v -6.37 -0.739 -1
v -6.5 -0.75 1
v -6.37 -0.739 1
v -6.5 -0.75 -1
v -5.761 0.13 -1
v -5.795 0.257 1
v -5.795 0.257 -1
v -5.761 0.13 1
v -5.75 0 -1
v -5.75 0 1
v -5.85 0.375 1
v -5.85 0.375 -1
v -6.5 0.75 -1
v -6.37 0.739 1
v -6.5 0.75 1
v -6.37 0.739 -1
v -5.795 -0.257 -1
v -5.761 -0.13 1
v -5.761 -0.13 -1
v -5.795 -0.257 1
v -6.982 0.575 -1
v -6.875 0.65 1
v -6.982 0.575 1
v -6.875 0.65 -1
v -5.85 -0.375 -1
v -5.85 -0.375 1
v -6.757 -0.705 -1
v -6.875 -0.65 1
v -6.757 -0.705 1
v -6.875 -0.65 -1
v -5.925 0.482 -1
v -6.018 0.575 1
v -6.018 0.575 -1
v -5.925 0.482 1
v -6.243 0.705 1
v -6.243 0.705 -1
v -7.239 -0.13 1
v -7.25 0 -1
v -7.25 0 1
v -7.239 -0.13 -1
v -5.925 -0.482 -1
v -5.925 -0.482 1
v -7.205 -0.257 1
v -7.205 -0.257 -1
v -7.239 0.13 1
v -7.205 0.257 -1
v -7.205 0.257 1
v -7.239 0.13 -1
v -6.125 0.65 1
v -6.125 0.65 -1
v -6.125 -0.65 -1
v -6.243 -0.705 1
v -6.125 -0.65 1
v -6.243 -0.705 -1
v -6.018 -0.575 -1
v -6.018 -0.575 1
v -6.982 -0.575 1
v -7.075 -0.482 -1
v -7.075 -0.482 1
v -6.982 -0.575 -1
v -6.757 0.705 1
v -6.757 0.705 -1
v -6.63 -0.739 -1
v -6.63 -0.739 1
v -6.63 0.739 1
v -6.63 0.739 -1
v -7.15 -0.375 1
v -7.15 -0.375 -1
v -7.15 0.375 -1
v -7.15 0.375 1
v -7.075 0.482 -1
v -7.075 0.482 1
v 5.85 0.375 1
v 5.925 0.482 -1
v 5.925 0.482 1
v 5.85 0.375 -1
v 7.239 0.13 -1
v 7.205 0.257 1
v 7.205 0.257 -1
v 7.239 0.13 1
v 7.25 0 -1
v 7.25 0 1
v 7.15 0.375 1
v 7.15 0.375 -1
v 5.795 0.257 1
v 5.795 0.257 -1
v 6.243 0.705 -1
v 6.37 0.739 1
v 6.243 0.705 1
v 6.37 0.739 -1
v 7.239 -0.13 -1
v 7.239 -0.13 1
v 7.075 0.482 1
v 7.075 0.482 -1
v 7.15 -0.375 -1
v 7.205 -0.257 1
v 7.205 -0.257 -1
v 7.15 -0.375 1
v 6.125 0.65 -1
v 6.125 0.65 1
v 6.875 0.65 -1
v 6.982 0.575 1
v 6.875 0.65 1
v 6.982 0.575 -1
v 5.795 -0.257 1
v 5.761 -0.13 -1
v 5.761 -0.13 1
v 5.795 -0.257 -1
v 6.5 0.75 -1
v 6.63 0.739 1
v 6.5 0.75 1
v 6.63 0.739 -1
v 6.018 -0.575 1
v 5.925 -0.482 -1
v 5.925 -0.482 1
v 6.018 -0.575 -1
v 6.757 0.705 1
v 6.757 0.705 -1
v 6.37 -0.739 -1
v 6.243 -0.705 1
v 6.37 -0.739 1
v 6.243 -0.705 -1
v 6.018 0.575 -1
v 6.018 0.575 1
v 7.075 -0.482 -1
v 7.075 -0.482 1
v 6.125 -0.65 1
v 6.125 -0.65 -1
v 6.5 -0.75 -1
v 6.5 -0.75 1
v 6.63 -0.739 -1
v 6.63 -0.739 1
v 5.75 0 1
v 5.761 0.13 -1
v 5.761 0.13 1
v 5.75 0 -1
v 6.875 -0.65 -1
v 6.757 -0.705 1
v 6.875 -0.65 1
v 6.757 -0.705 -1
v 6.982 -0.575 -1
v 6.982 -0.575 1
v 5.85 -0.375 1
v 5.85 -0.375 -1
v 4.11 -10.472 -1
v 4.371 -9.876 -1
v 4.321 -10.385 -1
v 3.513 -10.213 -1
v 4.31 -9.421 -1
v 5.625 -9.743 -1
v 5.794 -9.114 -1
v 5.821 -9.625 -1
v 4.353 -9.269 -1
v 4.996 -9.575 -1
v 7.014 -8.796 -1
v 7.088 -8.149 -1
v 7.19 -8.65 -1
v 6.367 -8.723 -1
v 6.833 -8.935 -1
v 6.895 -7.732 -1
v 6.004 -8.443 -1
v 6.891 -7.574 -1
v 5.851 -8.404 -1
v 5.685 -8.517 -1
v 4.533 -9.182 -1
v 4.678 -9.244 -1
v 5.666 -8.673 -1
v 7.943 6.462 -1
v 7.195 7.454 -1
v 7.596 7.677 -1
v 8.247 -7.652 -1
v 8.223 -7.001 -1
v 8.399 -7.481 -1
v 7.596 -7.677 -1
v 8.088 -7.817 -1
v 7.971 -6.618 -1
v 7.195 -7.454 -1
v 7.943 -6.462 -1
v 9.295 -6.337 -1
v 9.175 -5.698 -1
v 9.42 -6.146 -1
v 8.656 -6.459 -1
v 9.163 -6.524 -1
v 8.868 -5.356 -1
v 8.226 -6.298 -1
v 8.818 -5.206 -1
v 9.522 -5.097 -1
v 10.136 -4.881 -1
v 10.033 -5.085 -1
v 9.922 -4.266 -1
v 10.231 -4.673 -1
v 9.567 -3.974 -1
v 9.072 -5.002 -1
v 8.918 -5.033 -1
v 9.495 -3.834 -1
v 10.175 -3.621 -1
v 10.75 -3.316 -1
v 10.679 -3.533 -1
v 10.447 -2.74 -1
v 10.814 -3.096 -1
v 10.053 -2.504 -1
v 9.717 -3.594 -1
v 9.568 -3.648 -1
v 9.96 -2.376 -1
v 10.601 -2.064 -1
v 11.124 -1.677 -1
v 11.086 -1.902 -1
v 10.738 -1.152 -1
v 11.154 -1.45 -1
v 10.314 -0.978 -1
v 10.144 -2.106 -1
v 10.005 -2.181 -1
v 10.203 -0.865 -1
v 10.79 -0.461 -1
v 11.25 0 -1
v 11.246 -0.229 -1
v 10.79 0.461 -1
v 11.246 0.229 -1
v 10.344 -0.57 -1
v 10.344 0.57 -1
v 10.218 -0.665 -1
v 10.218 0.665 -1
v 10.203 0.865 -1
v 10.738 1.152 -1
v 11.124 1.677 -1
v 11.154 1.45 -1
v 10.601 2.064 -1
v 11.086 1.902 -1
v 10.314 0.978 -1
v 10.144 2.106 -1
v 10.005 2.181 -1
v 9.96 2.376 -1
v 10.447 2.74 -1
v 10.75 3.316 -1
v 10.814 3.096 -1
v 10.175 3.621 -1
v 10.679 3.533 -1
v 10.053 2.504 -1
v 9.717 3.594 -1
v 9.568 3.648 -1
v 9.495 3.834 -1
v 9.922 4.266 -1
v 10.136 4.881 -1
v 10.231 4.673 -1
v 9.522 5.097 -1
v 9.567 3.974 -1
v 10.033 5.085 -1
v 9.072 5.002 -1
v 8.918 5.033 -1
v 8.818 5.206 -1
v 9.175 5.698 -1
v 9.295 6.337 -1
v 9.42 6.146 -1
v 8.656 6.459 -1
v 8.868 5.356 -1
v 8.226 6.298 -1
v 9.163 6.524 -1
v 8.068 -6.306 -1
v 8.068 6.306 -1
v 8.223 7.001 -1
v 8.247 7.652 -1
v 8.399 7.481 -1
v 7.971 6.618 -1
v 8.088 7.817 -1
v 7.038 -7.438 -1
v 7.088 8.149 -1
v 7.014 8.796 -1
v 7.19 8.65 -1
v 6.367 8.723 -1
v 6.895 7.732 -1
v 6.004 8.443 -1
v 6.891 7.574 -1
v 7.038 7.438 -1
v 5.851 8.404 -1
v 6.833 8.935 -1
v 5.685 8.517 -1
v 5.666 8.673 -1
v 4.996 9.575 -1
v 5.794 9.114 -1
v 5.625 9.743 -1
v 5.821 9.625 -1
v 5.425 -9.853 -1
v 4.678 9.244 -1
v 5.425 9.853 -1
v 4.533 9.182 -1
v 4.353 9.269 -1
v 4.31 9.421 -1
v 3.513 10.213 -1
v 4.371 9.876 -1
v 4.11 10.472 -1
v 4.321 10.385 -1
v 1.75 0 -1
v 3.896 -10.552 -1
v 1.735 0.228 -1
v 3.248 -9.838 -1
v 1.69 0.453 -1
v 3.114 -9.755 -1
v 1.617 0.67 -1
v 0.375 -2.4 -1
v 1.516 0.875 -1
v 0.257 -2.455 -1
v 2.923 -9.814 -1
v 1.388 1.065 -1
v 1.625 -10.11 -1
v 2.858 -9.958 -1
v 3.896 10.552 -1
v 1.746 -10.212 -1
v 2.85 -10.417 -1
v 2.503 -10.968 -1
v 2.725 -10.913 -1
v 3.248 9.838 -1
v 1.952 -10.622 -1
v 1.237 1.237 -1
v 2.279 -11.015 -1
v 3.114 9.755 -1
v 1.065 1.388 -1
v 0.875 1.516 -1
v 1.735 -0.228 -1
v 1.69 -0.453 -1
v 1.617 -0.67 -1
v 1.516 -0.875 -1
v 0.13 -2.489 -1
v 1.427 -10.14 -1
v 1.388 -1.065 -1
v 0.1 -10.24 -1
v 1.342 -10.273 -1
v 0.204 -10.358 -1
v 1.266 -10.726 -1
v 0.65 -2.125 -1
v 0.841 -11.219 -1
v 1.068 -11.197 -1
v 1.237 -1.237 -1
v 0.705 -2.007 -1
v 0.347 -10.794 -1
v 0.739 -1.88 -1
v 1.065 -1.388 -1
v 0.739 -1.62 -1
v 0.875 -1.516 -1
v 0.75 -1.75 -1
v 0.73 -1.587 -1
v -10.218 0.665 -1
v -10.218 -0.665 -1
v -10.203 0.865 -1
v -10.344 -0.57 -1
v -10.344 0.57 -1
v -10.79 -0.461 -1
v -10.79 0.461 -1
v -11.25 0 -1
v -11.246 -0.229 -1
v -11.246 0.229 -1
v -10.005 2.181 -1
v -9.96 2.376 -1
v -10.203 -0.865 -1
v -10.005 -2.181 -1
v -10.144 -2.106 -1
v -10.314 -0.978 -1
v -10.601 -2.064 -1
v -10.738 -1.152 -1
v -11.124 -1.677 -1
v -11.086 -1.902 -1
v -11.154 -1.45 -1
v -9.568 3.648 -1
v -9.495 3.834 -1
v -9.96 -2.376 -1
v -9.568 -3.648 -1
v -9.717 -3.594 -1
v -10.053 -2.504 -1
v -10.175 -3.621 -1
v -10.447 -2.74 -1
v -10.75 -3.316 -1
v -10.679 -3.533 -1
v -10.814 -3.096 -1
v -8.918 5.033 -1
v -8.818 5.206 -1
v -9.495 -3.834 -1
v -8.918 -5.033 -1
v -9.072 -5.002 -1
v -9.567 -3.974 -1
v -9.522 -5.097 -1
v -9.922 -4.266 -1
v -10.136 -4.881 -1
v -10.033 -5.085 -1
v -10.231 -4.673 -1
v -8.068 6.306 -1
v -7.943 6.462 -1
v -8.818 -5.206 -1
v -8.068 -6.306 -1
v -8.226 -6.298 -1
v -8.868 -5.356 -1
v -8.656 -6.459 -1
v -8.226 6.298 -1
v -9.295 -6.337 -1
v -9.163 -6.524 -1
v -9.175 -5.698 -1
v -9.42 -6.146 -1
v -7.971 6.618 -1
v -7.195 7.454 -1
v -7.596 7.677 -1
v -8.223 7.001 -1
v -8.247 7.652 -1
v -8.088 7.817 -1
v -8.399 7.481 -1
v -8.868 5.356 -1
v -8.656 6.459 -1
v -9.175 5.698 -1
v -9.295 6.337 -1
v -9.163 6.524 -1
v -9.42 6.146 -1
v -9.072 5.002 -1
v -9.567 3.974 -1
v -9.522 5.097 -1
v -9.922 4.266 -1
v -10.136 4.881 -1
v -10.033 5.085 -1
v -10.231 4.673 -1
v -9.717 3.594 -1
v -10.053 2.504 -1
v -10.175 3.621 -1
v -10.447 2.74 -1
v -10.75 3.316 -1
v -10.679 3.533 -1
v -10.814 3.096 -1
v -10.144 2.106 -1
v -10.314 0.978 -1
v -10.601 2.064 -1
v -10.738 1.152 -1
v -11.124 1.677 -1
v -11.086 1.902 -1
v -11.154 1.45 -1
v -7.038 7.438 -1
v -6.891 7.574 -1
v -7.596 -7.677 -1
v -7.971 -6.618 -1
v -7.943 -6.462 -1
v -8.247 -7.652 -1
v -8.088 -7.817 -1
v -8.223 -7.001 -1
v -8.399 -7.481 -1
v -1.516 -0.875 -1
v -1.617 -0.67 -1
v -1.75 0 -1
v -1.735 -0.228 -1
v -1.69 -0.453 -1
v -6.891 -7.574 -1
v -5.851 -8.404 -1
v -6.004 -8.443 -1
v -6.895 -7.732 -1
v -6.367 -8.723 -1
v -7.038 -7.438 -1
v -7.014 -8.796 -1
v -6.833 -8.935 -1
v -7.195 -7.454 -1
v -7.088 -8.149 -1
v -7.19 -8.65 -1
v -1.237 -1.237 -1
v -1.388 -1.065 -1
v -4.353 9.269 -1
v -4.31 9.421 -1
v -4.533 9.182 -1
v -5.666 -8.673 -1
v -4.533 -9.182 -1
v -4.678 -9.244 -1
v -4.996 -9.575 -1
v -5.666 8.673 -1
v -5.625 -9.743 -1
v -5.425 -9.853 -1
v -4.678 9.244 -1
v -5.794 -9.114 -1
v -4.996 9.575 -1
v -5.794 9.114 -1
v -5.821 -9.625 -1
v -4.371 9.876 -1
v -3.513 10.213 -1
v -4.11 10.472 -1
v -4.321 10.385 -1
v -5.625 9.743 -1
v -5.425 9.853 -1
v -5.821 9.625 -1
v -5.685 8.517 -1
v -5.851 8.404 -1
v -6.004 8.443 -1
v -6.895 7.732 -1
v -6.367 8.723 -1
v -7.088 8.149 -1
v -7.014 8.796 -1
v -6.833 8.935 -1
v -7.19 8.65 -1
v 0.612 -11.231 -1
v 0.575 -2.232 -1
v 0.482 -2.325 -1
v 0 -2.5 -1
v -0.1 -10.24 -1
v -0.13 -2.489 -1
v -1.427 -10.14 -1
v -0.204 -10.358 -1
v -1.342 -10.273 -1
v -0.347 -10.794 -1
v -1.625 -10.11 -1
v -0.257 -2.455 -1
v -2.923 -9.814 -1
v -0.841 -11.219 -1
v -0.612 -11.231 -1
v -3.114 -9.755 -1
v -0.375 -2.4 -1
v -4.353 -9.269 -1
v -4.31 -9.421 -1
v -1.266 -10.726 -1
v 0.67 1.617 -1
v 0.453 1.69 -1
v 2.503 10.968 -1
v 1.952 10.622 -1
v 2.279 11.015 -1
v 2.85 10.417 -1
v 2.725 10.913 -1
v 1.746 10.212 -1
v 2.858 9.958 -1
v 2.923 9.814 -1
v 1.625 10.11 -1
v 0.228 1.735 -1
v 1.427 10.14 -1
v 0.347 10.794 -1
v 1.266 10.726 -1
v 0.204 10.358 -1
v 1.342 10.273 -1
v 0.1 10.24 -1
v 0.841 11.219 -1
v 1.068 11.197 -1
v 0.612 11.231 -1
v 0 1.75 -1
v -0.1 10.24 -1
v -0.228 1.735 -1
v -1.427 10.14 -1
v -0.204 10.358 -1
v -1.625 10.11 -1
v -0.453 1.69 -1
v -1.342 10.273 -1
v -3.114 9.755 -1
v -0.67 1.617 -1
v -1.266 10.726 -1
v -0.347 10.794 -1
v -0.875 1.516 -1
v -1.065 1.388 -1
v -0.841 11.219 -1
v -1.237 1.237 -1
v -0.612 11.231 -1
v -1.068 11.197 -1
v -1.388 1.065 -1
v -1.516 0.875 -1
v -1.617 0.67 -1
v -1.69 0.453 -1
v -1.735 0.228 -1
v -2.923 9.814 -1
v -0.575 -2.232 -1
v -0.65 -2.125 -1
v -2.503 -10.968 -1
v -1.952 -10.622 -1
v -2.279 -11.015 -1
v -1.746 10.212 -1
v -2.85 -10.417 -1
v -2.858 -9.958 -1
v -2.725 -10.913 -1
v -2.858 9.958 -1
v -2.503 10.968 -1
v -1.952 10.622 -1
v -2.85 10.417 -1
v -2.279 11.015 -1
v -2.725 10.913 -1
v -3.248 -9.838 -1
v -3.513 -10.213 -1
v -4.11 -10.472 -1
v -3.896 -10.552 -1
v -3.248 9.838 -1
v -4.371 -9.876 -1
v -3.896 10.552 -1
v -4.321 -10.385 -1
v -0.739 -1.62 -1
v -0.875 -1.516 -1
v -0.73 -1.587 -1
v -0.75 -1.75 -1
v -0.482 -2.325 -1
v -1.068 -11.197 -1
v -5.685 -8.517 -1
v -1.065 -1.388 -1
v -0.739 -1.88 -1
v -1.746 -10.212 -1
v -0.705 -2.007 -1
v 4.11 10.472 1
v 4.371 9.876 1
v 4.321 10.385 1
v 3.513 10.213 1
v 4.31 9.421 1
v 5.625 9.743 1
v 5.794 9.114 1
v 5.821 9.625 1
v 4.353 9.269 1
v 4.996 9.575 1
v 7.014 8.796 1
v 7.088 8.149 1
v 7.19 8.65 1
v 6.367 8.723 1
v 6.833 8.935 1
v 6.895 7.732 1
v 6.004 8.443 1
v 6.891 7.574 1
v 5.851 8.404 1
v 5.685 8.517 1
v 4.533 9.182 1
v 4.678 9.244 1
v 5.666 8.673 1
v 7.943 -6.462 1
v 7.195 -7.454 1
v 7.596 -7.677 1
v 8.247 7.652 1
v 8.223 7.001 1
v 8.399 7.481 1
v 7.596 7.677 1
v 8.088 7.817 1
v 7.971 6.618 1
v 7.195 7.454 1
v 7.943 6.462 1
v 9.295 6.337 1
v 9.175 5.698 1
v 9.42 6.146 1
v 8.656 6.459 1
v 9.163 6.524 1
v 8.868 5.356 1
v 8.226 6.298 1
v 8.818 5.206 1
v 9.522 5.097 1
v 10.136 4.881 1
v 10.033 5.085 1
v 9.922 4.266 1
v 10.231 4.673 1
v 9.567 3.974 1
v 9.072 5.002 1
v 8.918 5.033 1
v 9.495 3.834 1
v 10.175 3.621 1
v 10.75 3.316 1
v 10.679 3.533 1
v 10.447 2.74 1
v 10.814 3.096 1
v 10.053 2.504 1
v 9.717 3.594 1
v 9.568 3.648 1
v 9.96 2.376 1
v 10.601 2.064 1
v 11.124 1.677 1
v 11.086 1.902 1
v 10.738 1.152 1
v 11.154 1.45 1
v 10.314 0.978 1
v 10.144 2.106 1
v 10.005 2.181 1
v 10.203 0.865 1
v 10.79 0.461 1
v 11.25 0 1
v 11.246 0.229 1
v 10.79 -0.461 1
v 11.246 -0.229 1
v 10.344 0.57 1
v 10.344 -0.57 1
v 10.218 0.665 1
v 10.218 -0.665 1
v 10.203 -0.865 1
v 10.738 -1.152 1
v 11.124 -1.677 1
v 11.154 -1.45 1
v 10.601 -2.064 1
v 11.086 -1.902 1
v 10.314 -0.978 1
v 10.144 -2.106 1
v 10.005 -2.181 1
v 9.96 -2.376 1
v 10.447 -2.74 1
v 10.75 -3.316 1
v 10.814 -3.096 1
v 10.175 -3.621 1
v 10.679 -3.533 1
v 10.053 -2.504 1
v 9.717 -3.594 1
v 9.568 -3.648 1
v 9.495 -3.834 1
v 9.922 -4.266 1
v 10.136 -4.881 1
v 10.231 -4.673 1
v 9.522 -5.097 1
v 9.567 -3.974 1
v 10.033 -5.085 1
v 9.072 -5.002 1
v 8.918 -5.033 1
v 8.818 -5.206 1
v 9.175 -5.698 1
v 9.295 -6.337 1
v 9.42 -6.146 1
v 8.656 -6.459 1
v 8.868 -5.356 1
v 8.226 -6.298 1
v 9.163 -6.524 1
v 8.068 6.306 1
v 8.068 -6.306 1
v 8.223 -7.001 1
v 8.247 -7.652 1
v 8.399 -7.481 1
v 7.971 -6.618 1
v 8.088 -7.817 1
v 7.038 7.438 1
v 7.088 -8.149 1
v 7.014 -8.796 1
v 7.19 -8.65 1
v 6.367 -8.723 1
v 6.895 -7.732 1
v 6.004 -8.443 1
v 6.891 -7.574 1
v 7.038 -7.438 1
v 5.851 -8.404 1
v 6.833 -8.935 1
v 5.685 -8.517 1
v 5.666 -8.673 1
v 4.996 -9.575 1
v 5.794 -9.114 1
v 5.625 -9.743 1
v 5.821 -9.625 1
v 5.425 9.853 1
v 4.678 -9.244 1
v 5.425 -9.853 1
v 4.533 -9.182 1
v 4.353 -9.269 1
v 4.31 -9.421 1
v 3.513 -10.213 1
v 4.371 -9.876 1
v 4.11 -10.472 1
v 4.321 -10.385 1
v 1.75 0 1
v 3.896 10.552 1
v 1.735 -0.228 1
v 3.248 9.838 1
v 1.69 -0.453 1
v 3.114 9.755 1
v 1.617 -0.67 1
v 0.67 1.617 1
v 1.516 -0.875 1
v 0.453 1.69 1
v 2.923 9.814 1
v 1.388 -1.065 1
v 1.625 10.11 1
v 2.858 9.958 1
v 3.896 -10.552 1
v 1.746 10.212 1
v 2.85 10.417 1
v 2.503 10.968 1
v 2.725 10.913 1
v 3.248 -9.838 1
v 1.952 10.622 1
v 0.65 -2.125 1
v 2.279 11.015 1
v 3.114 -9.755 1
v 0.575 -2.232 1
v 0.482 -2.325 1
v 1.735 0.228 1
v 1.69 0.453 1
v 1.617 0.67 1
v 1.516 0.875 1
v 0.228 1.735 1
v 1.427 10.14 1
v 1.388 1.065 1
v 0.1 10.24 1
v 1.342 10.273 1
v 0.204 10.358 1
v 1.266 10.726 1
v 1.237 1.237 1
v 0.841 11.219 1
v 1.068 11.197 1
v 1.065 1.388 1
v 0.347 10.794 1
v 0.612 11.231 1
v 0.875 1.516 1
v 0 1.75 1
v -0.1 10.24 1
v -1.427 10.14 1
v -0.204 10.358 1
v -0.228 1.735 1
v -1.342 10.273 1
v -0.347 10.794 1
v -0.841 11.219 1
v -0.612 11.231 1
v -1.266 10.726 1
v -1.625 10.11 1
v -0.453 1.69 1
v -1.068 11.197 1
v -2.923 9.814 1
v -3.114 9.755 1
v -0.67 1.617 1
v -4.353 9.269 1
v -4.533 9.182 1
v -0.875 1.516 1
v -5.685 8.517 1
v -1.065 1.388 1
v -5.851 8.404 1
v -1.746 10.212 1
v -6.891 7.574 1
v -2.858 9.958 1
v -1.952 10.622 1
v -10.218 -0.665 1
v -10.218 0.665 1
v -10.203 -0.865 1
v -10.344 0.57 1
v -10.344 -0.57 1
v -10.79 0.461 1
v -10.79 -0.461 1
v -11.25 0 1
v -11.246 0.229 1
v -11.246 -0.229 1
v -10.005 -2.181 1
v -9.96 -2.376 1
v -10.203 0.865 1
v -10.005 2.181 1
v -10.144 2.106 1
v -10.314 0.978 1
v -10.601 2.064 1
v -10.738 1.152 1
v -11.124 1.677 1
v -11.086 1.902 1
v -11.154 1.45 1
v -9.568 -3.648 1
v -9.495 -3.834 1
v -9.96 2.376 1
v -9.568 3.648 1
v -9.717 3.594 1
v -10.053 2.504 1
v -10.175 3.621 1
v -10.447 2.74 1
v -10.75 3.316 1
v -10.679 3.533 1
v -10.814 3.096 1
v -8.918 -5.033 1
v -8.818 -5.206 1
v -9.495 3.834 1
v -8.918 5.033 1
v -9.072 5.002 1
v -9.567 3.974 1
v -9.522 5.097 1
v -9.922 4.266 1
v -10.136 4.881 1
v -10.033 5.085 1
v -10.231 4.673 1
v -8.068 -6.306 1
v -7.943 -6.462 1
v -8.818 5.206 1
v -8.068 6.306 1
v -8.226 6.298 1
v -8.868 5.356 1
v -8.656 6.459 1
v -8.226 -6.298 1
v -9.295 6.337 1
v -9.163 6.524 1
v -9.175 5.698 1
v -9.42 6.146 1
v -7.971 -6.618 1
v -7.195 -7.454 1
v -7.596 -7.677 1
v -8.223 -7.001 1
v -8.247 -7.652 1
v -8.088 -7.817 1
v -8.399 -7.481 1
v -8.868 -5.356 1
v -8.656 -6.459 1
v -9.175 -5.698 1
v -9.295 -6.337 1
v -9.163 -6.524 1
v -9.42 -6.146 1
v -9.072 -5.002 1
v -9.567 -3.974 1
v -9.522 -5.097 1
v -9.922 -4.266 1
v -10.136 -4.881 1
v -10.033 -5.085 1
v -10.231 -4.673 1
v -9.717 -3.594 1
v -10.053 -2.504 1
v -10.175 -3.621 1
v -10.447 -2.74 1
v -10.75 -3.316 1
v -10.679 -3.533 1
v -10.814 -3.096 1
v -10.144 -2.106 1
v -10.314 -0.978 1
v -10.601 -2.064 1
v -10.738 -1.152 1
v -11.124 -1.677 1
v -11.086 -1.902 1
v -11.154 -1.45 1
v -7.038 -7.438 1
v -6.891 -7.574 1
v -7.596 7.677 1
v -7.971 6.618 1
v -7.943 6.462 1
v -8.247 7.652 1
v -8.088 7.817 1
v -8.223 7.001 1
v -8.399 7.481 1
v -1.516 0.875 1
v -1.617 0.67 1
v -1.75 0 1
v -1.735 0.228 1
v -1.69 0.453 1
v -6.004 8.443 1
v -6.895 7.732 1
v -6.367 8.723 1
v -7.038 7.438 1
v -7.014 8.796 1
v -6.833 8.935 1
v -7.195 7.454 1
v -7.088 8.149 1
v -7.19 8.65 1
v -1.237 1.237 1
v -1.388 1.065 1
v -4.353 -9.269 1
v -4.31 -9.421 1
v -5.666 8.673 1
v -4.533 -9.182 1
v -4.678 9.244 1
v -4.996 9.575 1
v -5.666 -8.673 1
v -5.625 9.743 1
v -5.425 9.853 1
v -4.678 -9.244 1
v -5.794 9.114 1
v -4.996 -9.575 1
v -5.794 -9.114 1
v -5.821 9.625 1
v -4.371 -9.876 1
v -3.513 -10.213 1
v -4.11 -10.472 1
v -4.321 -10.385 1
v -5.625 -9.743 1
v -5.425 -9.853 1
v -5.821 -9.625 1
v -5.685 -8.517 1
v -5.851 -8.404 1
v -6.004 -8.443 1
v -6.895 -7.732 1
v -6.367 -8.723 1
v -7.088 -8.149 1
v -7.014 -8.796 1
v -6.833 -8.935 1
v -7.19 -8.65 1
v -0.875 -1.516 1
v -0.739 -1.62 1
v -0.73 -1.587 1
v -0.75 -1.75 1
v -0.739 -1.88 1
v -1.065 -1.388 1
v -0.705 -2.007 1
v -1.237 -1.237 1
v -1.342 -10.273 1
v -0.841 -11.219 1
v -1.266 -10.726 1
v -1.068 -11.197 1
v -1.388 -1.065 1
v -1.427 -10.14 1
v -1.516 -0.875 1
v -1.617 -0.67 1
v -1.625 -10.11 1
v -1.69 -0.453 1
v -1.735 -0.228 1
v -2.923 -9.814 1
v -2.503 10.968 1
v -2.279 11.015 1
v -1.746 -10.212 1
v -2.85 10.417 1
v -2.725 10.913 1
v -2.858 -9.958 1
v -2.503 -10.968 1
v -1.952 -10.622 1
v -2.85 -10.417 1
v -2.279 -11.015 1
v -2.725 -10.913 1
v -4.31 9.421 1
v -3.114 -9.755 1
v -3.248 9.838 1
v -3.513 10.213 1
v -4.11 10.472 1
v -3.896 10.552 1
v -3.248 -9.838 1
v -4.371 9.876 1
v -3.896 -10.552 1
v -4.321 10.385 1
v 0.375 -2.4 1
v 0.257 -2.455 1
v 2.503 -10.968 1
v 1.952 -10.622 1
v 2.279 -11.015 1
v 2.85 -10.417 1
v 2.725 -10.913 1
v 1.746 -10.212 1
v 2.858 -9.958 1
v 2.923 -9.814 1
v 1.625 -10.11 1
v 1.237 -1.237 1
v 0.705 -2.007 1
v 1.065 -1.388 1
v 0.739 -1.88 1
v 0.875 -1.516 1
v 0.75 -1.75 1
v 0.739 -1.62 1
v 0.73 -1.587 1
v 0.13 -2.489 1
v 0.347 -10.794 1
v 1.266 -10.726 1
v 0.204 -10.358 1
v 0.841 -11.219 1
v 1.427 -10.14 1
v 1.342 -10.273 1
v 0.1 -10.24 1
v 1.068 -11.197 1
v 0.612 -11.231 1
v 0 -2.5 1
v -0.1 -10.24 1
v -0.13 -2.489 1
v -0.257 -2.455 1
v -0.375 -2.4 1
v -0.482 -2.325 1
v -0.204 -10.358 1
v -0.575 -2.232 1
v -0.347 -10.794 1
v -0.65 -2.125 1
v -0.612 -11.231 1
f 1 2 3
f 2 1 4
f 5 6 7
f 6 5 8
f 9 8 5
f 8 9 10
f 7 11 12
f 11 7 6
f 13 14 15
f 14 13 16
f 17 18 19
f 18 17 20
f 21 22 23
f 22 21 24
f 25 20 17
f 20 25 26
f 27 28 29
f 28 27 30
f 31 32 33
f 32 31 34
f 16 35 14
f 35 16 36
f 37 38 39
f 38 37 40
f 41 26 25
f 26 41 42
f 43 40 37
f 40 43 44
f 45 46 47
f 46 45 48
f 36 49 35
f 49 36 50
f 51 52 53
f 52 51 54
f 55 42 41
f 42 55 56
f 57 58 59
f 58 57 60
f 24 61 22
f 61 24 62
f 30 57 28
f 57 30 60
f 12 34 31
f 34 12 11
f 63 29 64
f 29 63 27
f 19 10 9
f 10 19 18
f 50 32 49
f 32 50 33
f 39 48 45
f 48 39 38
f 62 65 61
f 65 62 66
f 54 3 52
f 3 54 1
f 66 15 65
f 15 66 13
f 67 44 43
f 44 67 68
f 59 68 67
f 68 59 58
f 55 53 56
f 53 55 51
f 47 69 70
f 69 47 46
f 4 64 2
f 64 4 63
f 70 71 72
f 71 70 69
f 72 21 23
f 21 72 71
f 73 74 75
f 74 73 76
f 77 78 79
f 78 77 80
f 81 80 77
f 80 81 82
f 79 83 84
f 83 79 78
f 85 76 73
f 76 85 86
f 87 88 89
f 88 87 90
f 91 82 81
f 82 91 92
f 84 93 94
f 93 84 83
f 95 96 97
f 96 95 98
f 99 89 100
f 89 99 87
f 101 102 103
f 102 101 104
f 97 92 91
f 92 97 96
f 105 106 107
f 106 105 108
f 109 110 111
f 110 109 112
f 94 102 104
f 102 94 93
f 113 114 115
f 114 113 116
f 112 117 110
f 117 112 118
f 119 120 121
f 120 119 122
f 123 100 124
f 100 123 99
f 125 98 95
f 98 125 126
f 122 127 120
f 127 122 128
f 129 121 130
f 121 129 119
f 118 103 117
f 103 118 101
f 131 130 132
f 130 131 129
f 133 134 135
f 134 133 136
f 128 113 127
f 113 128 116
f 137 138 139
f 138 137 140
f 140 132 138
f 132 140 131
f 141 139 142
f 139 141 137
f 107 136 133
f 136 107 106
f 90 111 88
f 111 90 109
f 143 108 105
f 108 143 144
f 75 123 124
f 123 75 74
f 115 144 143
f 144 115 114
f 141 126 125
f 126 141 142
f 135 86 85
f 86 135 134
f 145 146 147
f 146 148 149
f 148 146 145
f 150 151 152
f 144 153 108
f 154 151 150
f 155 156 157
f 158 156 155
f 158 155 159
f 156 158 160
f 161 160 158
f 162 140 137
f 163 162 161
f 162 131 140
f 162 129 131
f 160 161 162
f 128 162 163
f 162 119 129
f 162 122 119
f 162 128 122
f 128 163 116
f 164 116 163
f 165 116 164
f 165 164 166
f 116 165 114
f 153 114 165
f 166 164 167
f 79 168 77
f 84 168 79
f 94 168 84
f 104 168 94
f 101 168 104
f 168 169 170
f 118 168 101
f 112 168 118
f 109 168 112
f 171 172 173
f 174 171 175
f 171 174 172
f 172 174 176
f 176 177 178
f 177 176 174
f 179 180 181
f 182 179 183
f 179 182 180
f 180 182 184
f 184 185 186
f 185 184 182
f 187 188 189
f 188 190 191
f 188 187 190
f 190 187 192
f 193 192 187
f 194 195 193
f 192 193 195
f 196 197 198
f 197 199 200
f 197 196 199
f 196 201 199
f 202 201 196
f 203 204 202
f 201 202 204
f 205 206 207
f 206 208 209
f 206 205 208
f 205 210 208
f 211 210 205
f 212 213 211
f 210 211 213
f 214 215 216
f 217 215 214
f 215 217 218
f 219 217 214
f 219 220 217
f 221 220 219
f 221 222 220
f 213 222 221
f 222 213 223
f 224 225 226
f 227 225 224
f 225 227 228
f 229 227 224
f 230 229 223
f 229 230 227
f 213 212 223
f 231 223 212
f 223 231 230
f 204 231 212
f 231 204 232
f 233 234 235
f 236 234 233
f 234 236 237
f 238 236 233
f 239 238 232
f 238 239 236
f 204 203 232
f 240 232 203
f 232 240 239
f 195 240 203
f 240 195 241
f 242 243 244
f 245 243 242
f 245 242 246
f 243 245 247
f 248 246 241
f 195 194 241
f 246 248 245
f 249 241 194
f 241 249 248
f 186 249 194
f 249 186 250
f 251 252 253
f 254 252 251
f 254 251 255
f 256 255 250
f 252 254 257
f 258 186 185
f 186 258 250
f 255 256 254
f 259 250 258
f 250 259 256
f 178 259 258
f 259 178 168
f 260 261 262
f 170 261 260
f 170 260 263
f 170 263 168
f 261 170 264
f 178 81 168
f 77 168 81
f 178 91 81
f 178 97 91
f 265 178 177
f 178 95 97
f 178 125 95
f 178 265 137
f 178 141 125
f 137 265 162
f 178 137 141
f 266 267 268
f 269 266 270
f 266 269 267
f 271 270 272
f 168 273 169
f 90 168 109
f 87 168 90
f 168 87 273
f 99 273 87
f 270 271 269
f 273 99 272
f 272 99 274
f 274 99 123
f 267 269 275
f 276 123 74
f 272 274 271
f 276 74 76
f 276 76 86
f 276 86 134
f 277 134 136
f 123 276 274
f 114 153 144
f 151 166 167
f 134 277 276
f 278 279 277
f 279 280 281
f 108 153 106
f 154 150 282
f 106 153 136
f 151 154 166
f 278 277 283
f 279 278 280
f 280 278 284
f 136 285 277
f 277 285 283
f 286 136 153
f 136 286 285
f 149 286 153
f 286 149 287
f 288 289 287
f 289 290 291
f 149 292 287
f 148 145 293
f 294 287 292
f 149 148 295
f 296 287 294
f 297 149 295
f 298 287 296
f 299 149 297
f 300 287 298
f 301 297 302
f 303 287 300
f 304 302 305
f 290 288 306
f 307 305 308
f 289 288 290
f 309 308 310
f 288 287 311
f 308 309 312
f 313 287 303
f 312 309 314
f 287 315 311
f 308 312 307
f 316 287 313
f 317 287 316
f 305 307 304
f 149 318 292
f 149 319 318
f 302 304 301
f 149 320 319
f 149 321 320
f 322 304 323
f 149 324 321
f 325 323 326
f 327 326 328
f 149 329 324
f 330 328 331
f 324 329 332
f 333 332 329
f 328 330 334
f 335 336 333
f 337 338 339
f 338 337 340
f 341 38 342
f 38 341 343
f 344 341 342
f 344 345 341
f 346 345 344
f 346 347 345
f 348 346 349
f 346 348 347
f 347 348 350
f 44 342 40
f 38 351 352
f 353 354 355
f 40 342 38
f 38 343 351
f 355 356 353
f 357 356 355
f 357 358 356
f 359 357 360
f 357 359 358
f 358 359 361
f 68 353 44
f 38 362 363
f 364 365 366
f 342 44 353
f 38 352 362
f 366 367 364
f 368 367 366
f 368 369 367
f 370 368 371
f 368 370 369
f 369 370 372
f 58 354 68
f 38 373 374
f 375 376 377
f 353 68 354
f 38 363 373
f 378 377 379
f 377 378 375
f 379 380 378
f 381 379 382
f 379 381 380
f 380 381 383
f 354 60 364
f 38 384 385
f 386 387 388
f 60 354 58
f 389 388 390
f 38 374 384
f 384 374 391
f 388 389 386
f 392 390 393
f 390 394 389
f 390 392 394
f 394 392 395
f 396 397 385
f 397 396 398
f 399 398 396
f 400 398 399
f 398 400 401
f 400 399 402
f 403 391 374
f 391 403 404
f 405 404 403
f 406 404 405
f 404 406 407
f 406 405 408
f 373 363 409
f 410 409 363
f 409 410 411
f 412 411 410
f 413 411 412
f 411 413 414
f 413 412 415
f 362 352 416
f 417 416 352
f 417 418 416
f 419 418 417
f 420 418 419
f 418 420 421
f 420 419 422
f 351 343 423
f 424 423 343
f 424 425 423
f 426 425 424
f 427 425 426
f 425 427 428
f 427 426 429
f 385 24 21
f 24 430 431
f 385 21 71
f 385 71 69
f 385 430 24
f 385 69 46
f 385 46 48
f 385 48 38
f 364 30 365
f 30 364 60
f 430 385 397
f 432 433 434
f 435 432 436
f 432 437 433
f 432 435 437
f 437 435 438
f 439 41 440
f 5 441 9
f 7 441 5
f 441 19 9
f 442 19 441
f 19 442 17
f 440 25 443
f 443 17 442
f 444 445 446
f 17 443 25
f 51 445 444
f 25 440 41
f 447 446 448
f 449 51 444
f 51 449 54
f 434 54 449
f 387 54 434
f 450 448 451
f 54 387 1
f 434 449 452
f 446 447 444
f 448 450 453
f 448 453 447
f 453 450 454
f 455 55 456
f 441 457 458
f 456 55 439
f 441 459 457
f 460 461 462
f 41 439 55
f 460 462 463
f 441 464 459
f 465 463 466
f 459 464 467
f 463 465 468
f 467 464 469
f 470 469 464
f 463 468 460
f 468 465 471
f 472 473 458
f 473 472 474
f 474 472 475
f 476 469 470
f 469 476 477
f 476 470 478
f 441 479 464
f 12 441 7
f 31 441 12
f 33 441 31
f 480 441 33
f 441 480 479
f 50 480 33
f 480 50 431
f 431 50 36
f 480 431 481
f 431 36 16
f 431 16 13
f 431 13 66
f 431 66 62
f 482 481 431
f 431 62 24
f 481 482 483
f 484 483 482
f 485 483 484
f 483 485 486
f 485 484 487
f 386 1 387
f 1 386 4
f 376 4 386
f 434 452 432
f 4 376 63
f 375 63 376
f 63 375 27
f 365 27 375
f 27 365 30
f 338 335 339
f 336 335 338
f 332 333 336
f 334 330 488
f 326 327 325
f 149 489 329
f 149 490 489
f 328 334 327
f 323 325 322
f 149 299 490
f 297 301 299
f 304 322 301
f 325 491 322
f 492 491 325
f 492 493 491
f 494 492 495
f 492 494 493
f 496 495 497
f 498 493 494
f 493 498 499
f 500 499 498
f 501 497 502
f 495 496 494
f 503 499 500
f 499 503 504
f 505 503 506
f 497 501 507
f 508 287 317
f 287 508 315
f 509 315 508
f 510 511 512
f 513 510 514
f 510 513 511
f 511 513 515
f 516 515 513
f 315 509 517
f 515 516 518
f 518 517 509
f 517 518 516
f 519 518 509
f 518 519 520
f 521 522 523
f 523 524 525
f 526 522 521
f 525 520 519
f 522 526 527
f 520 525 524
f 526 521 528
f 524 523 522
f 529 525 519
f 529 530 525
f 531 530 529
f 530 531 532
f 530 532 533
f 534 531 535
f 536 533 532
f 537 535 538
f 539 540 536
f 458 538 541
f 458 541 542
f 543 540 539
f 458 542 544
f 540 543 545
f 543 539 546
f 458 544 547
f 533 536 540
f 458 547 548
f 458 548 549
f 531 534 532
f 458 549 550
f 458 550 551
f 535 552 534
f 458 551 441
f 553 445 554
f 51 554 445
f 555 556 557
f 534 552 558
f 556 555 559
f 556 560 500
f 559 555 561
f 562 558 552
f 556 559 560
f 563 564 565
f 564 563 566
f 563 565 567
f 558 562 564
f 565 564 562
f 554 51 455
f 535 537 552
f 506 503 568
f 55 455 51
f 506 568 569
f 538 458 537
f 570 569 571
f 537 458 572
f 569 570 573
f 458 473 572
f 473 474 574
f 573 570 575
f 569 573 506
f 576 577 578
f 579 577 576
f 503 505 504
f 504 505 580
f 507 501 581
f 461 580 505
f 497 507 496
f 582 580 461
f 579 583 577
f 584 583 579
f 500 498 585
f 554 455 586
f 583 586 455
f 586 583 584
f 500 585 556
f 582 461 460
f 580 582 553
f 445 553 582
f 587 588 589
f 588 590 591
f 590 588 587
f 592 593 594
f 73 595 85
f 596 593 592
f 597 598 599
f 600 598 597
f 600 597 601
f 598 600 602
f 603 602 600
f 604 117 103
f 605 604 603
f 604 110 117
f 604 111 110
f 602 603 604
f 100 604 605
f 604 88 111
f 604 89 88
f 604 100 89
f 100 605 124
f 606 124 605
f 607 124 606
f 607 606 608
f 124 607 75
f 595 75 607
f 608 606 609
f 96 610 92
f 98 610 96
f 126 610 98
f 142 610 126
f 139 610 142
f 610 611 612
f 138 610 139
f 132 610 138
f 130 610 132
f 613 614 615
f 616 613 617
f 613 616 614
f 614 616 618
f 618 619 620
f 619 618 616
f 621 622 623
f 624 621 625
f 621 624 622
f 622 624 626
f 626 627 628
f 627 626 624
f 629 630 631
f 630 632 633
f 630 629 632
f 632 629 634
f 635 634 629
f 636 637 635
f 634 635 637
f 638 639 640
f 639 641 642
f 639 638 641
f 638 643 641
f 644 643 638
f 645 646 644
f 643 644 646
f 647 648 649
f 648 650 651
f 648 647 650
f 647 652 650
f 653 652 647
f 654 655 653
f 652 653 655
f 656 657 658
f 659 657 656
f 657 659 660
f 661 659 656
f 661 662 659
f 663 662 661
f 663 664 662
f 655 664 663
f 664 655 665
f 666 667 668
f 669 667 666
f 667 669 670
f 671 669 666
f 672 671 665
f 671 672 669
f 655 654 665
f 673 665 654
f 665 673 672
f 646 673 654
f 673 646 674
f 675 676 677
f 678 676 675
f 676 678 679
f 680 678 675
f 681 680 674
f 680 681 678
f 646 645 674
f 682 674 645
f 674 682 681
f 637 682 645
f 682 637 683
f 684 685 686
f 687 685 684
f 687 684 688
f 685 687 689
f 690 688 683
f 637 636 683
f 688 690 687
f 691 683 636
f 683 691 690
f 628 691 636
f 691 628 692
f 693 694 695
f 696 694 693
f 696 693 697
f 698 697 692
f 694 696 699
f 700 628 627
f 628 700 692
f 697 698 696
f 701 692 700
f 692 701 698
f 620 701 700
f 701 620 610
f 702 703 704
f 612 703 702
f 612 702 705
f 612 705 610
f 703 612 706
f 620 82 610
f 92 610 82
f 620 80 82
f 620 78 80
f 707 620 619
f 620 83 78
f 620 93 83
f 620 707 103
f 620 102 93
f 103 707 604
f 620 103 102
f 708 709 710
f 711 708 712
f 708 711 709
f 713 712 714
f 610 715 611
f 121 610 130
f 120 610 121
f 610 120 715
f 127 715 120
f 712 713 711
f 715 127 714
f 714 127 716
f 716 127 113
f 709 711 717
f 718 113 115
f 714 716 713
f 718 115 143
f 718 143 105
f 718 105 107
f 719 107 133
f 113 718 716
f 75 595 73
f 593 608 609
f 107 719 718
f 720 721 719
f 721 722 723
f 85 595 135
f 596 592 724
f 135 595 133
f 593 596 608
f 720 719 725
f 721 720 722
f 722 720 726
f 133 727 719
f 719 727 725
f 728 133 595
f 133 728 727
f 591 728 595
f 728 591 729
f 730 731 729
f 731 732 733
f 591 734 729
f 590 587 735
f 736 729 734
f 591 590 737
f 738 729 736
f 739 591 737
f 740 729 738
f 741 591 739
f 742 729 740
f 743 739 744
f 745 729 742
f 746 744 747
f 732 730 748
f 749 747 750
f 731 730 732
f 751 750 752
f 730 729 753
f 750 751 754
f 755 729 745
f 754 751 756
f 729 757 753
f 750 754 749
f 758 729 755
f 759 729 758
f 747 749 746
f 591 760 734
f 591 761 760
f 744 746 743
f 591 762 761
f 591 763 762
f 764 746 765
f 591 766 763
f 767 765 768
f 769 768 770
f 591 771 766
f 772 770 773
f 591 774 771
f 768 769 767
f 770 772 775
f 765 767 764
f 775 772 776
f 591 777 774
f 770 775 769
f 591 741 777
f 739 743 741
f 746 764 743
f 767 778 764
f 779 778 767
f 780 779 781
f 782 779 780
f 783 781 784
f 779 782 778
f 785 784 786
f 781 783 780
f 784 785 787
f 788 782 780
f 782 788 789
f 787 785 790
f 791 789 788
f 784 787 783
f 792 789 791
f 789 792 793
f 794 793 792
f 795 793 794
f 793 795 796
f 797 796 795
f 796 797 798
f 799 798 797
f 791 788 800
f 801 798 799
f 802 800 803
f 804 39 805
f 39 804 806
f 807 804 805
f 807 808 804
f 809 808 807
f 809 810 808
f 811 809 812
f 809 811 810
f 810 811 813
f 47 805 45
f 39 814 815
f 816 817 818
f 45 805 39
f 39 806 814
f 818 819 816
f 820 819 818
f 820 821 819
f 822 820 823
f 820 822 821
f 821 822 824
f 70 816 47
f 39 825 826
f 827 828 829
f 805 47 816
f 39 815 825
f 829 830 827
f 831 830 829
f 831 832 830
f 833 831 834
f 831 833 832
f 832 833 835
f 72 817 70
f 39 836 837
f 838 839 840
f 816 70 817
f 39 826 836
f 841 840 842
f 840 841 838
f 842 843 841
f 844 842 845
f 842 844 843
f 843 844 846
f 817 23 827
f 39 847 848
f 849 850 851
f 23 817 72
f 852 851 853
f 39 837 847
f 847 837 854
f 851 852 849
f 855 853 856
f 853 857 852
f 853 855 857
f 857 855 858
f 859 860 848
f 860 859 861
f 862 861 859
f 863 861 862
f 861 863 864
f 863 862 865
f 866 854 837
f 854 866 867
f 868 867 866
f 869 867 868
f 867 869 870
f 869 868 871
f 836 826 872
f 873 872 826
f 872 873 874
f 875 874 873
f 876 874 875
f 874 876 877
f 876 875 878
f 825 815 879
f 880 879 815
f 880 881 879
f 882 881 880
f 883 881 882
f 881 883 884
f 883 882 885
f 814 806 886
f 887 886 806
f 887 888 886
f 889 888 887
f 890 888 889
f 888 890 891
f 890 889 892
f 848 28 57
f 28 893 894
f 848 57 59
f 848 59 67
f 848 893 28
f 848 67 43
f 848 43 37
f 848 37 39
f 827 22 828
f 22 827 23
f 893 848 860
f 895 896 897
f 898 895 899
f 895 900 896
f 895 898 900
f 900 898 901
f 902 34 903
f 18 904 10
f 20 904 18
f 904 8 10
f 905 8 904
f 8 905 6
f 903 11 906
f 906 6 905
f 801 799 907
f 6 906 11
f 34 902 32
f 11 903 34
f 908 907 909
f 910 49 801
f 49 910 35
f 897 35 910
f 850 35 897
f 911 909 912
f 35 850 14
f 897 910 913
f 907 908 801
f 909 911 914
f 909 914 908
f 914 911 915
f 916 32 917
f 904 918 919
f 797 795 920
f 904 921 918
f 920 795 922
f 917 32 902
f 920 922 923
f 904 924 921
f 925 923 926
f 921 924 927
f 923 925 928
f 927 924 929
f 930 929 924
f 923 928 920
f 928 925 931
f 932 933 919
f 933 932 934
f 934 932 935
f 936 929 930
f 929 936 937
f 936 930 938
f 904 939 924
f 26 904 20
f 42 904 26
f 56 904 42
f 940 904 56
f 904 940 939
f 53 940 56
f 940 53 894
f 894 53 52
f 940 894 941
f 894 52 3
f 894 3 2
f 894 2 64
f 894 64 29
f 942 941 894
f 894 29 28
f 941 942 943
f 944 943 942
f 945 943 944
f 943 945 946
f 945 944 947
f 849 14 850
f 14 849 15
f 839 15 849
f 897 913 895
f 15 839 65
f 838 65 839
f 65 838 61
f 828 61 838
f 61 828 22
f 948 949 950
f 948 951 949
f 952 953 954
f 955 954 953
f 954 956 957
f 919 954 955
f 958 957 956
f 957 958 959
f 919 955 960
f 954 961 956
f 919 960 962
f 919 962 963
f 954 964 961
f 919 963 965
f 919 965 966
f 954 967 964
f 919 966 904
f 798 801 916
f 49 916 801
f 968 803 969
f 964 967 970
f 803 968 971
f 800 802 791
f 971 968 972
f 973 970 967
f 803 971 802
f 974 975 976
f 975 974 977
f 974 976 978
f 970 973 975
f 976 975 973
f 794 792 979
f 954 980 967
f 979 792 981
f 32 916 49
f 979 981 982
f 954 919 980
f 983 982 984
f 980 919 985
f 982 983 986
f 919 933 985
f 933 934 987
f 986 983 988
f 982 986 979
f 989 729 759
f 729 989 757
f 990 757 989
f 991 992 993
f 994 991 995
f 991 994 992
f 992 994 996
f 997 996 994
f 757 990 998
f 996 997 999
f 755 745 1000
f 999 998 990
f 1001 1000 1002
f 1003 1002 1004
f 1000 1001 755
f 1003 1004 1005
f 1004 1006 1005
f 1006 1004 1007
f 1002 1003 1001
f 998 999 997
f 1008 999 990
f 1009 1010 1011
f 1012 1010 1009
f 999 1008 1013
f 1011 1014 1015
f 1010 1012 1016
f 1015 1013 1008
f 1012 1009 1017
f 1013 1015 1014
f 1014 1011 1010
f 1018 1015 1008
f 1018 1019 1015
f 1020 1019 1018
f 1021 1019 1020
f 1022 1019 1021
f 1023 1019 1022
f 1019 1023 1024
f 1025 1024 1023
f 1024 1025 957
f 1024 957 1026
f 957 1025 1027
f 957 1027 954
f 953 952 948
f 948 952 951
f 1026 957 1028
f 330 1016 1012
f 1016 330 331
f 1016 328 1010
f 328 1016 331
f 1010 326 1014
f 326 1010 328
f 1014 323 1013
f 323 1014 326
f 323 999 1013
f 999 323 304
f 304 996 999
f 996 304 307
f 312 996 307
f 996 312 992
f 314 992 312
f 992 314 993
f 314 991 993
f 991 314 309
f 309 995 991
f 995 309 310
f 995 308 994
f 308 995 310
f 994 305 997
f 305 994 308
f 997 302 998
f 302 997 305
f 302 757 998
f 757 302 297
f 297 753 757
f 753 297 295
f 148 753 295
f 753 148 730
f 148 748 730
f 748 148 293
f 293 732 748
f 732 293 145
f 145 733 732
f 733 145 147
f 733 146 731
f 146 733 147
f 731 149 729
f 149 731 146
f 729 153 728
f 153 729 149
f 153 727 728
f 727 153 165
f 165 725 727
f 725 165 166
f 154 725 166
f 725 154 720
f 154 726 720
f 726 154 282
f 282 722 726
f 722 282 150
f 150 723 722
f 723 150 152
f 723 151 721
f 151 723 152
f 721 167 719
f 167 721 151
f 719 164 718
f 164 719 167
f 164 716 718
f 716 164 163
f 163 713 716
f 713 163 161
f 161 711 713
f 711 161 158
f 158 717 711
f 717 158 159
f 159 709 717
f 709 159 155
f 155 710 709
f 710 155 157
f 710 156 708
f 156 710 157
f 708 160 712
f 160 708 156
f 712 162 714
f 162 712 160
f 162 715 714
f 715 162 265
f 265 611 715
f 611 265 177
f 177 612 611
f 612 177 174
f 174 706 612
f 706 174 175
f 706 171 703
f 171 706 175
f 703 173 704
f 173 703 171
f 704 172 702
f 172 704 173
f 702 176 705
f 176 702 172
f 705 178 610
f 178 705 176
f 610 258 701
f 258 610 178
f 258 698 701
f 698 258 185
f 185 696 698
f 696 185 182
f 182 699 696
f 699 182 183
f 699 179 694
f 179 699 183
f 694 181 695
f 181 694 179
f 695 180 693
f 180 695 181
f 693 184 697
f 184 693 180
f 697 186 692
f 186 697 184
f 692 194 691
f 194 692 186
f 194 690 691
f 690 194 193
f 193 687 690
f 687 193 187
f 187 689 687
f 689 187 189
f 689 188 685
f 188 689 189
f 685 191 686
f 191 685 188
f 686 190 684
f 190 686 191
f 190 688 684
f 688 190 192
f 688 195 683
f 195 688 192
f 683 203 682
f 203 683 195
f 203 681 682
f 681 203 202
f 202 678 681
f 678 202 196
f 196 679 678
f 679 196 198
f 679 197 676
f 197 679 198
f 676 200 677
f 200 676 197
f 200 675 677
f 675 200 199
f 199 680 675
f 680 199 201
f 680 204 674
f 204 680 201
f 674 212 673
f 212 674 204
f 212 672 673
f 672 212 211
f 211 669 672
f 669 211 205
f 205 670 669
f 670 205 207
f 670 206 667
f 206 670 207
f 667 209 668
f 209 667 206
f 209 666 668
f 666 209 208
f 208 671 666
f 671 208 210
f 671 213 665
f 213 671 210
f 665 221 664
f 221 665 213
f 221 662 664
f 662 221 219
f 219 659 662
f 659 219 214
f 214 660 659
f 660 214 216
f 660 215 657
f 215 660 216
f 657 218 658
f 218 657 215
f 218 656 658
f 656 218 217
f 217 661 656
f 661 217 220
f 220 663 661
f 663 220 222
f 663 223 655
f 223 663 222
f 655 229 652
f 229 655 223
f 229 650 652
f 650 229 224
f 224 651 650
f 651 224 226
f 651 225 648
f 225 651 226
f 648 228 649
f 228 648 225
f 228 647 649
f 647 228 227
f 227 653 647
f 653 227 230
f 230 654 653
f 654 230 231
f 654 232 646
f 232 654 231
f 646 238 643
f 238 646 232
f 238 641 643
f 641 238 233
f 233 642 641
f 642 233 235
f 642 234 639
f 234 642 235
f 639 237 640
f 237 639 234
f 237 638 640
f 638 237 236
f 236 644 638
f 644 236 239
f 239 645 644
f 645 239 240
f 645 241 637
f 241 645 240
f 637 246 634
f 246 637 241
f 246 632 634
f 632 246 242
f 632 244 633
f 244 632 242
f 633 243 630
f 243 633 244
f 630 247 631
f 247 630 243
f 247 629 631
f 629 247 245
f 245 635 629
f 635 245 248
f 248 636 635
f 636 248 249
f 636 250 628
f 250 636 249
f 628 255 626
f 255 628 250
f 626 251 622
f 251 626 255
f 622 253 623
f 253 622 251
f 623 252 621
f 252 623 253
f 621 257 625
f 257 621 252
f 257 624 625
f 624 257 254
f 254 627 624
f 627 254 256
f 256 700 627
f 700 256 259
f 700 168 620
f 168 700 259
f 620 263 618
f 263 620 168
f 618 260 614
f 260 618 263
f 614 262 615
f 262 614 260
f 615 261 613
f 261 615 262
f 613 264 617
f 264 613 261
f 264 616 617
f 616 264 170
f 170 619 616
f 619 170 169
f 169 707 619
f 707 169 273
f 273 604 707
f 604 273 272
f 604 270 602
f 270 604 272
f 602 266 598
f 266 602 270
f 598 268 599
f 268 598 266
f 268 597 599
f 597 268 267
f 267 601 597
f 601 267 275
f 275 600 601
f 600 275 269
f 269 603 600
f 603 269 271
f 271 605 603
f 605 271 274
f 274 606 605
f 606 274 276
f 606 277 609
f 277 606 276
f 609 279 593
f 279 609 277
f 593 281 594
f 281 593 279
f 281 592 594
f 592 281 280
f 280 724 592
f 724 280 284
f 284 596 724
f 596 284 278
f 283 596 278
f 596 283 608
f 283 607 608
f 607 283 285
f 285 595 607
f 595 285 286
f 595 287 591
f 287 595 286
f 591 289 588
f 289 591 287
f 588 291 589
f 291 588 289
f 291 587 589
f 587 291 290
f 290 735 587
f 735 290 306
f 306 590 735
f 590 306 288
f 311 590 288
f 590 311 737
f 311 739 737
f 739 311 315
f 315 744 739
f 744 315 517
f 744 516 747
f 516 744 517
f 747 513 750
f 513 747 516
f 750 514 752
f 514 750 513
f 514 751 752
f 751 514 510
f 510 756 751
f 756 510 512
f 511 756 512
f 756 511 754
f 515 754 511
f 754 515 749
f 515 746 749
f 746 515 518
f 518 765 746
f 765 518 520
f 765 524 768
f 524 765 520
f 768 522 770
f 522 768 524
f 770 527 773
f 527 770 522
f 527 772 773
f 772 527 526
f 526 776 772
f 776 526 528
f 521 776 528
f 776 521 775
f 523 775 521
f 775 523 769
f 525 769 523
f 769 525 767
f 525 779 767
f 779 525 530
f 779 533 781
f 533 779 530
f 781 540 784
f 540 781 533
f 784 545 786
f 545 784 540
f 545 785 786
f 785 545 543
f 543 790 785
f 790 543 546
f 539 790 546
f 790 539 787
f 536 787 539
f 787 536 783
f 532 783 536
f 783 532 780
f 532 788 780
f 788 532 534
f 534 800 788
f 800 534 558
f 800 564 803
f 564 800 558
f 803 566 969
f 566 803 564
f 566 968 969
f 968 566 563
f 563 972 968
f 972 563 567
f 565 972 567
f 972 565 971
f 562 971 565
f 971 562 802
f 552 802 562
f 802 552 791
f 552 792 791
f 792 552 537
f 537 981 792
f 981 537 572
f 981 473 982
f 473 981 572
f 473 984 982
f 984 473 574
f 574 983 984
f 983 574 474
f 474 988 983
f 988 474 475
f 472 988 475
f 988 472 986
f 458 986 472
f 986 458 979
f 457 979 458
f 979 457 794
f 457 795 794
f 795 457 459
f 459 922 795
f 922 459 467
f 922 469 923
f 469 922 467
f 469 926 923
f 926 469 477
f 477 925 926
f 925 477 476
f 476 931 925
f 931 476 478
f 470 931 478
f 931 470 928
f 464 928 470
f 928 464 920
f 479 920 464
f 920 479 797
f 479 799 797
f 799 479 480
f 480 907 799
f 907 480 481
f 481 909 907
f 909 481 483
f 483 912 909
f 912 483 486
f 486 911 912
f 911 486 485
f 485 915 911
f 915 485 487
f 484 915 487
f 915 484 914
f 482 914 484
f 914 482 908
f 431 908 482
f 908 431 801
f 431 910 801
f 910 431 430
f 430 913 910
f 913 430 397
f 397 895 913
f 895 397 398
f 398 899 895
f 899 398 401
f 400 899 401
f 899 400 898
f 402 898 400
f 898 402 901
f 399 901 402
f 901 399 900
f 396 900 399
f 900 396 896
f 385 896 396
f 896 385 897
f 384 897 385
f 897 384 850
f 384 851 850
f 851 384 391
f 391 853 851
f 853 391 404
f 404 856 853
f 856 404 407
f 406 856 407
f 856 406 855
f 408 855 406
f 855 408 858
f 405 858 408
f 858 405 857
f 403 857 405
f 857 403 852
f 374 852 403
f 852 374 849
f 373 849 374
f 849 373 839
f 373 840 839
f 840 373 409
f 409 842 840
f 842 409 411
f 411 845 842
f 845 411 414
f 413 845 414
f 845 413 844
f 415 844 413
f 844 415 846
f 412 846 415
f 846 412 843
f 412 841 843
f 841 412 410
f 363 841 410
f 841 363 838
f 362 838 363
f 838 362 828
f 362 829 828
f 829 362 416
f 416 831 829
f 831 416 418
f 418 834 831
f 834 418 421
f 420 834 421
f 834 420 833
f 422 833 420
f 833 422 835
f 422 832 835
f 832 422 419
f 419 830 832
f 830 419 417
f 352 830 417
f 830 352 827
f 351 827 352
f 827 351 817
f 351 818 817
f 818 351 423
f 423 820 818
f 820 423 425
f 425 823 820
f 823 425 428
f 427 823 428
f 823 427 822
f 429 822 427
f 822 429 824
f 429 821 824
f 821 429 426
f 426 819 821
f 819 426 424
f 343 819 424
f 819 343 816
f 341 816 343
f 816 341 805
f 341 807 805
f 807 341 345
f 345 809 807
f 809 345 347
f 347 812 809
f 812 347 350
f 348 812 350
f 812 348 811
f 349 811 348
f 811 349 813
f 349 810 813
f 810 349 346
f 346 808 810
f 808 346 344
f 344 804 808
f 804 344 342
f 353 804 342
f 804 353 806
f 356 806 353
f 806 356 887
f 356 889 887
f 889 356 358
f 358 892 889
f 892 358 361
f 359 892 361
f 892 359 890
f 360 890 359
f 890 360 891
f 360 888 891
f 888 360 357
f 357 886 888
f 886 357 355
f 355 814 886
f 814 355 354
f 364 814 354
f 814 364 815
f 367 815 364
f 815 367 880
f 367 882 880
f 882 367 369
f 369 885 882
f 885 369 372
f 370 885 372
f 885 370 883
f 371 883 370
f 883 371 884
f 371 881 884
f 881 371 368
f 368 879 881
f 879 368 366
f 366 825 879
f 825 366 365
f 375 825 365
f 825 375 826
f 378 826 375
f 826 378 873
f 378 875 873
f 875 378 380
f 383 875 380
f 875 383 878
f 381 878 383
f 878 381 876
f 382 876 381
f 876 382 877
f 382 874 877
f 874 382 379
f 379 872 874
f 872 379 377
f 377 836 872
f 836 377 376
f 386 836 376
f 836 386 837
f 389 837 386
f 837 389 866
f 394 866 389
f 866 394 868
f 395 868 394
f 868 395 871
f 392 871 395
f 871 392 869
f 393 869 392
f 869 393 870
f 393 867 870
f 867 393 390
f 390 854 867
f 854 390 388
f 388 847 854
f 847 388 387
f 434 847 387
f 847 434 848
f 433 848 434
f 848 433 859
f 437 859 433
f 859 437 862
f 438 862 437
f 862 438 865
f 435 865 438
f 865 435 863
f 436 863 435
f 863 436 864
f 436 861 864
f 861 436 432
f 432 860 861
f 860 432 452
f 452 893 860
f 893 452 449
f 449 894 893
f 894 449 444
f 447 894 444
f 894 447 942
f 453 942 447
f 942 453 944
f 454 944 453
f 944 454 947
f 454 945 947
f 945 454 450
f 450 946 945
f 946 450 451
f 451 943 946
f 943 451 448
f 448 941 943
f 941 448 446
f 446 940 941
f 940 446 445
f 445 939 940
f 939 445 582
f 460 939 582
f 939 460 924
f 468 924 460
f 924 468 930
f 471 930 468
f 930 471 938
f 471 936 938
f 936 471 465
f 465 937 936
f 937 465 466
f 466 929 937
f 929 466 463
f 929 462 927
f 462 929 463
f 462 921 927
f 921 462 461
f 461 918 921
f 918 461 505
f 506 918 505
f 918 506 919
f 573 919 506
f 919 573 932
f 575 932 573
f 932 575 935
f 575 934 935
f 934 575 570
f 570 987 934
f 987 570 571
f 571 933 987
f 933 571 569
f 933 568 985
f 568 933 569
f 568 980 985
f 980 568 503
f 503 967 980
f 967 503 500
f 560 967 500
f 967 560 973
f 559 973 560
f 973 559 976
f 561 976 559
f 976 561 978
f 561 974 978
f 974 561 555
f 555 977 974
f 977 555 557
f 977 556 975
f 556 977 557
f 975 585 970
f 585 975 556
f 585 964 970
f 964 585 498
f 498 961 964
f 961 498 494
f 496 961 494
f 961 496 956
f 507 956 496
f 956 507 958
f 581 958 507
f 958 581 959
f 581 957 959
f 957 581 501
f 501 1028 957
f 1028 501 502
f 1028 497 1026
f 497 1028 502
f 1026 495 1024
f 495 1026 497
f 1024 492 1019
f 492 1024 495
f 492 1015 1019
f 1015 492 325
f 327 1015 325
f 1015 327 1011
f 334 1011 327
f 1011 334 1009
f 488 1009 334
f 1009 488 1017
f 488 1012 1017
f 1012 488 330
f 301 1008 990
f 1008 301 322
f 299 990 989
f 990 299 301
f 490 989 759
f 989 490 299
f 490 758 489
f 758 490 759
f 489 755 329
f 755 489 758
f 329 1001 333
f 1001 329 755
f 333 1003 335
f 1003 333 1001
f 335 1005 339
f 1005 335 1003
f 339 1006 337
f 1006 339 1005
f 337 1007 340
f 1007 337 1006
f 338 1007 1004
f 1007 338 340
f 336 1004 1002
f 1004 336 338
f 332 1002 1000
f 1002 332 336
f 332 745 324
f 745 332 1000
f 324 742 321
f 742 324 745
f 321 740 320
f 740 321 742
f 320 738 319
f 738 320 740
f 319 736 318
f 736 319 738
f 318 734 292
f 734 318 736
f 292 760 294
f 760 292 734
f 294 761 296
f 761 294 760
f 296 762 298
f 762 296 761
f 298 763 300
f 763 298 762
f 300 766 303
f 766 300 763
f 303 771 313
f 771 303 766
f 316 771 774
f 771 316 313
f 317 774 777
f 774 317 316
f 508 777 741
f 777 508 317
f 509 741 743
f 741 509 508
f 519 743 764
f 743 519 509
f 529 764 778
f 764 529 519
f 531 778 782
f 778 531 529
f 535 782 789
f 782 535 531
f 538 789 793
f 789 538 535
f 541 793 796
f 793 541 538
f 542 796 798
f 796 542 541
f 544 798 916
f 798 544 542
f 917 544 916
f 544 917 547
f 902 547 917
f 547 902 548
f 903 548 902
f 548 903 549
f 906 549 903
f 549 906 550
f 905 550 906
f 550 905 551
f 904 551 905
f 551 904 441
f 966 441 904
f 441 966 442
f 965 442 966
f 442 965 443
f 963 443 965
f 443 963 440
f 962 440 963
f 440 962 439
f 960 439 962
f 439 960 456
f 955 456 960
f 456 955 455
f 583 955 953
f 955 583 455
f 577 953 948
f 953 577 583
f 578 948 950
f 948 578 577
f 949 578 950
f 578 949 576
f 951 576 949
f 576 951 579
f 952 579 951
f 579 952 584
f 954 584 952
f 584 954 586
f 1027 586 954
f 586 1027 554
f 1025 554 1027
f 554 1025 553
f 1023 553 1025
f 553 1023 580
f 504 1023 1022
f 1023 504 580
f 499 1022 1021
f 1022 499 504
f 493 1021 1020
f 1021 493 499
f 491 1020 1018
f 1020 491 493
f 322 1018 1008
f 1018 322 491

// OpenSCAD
// part_id: c2
// name: C2 gear
// source_drawing_ids: DRW-004
// units: mm
// SPDX-License-Identifier: MIT
//
// Part C2: smaller coaxial gear from the b/c gear train.
//
// Local origin convention:
// - XY origin is the gear rotation axis.
// - Z origin is the part midplane.
// - Assembly placement and animation should be applied outside this file.

function c2_polar(r, a_deg) = [r * cos(a_deg), r * sin(a_deg)];

module c2_tooth_gap_2d(
    outer_r = 11.25,
    root_r = 10.24,
    pitch_deg = 360 / 42,
    tip_land_deg = 1.25,
    shoulder_r = 10.80,
    shoulder_deg = 1.84,
    throat_r = 10.36,
    throat_deg = 1.13,
    root_deg = 0.56
) {
    gap_half_deg = max((pitch_deg - tip_land_deg) / 2, throat_deg + 0.15);

    polygon(points = [
        c2_polar(outer_r + 0.2, -gap_half_deg),
        c2_polar(shoulder_r, -shoulder_deg),
        c2_polar(throat_r, -throat_deg),
        c2_polar(root_r, -root_deg),
        c2_polar(root_r, root_deg),
        c2_polar(throat_r, throat_deg),
        c2_polar(shoulder_r, shoulder_deg),
        c2_polar(outer_r + 0.2, gap_half_deg)
    ]);
}

module c2_gear_profile_2d(
    outer_d = 22.50,
    root_d = 20.48,
    tooth_count = 42,
    tip_land_deg = 1.25,
    shoulder_d = 21.60,
    shoulder_deg = 1.84,
    throat_d = 20.72,
    throat_deg = 1.13,
    root_deg = 0.56,
    tooth_cut_count = undef,
    tooth_cut_start = -1,
    tooth_cut_angle_deg = 90
) {
    pitch_deg = 360 / tooth_count;
    cut_count = is_undef(tooth_cut_count) ? tooth_count : tooth_cut_count;

    difference() {
        circle(d = outer_d, $fn = max(160, tooth_count * 4));
        for (i = [0 : cut_count - 1]) {
            rotate(tooth_cut_angle_deg + (tooth_cut_start + i) * pitch_deg)
                c2_tooth_gap_2d(
                    outer_r = outer_d / 2,
                    root_r = root_d / 2,
                    pitch_deg = pitch_deg,
                    tip_land_deg = tip_land_deg,
                    shoulder_r = shoulder_d / 2,
                    shoulder_deg = shoulder_deg,
                    throat_r = throat_d / 2,
                    throat_deg = throat_deg,
                    root_deg = root_deg
                );
        }
    }
}

module c2_center_bore_2d(bore_d = 3.5, relief_r = 0.75) {
    union() {
        circle(d = bore_d, $fn = 48);
        translate([0, -bore_d / 2]) circle(r = relief_r, $fn = 36);
    }
}

module part_c2(
    outer_d = 22.50,
    thickness = 2.0,
    tooth_count = 42,
    root_d = 20.48,
    tip_land_deg = 1.25,
    shoulder_d = 21.60,
    shoulder_deg = 1.84,
    throat_d = 20.72,
    throat_deg = 1.13,
    root_deg = 0.56,
    tooth_cut_count = undef,
    tooth_cut_start = -1,
    tooth_cut_angle_deg = 90,
    bore_d = 3.5,
    lower_relief_r = 0.75,
    side_hole_d = 1.50,
    side_hole_radius = 6.50
) {
    difference() {
        linear_extrude(height = thickness, center = true)
            c2_gear_profile_2d(
                outer_d = outer_d,
                root_d = root_d,
                tooth_count = tooth_count,
                tip_land_deg = tip_land_deg,
                shoulder_d = shoulder_d,
                shoulder_deg = shoulder_deg,
                throat_d = throat_d,
                throat_deg = throat_deg,
                root_deg = root_deg,
                tooth_cut_count = tooth_cut_count,
                tooth_cut_start = tooth_cut_start,
                tooth_cut_angle_deg = tooth_cut_angle_deg
            );

        translate([0, 0, -thickness / 2 - 0.1])
            linear_extrude(height = thickness + 0.2)
                c2_center_bore_2d(
                    bore_d = bore_d,
                    relief_r = lower_relief_r
                );

        for (x = [-side_hole_radius, side_hole_radius]) {
            translate([x, 0, 0])
                cylinder(d = side_hole_d, h = thickness + 0.2, center = true, $fn = 36);
        }
    }
}

// ---- "main guard" ----
if (is_undef(__LIB_MODE__)) {
    part_c2();
}
